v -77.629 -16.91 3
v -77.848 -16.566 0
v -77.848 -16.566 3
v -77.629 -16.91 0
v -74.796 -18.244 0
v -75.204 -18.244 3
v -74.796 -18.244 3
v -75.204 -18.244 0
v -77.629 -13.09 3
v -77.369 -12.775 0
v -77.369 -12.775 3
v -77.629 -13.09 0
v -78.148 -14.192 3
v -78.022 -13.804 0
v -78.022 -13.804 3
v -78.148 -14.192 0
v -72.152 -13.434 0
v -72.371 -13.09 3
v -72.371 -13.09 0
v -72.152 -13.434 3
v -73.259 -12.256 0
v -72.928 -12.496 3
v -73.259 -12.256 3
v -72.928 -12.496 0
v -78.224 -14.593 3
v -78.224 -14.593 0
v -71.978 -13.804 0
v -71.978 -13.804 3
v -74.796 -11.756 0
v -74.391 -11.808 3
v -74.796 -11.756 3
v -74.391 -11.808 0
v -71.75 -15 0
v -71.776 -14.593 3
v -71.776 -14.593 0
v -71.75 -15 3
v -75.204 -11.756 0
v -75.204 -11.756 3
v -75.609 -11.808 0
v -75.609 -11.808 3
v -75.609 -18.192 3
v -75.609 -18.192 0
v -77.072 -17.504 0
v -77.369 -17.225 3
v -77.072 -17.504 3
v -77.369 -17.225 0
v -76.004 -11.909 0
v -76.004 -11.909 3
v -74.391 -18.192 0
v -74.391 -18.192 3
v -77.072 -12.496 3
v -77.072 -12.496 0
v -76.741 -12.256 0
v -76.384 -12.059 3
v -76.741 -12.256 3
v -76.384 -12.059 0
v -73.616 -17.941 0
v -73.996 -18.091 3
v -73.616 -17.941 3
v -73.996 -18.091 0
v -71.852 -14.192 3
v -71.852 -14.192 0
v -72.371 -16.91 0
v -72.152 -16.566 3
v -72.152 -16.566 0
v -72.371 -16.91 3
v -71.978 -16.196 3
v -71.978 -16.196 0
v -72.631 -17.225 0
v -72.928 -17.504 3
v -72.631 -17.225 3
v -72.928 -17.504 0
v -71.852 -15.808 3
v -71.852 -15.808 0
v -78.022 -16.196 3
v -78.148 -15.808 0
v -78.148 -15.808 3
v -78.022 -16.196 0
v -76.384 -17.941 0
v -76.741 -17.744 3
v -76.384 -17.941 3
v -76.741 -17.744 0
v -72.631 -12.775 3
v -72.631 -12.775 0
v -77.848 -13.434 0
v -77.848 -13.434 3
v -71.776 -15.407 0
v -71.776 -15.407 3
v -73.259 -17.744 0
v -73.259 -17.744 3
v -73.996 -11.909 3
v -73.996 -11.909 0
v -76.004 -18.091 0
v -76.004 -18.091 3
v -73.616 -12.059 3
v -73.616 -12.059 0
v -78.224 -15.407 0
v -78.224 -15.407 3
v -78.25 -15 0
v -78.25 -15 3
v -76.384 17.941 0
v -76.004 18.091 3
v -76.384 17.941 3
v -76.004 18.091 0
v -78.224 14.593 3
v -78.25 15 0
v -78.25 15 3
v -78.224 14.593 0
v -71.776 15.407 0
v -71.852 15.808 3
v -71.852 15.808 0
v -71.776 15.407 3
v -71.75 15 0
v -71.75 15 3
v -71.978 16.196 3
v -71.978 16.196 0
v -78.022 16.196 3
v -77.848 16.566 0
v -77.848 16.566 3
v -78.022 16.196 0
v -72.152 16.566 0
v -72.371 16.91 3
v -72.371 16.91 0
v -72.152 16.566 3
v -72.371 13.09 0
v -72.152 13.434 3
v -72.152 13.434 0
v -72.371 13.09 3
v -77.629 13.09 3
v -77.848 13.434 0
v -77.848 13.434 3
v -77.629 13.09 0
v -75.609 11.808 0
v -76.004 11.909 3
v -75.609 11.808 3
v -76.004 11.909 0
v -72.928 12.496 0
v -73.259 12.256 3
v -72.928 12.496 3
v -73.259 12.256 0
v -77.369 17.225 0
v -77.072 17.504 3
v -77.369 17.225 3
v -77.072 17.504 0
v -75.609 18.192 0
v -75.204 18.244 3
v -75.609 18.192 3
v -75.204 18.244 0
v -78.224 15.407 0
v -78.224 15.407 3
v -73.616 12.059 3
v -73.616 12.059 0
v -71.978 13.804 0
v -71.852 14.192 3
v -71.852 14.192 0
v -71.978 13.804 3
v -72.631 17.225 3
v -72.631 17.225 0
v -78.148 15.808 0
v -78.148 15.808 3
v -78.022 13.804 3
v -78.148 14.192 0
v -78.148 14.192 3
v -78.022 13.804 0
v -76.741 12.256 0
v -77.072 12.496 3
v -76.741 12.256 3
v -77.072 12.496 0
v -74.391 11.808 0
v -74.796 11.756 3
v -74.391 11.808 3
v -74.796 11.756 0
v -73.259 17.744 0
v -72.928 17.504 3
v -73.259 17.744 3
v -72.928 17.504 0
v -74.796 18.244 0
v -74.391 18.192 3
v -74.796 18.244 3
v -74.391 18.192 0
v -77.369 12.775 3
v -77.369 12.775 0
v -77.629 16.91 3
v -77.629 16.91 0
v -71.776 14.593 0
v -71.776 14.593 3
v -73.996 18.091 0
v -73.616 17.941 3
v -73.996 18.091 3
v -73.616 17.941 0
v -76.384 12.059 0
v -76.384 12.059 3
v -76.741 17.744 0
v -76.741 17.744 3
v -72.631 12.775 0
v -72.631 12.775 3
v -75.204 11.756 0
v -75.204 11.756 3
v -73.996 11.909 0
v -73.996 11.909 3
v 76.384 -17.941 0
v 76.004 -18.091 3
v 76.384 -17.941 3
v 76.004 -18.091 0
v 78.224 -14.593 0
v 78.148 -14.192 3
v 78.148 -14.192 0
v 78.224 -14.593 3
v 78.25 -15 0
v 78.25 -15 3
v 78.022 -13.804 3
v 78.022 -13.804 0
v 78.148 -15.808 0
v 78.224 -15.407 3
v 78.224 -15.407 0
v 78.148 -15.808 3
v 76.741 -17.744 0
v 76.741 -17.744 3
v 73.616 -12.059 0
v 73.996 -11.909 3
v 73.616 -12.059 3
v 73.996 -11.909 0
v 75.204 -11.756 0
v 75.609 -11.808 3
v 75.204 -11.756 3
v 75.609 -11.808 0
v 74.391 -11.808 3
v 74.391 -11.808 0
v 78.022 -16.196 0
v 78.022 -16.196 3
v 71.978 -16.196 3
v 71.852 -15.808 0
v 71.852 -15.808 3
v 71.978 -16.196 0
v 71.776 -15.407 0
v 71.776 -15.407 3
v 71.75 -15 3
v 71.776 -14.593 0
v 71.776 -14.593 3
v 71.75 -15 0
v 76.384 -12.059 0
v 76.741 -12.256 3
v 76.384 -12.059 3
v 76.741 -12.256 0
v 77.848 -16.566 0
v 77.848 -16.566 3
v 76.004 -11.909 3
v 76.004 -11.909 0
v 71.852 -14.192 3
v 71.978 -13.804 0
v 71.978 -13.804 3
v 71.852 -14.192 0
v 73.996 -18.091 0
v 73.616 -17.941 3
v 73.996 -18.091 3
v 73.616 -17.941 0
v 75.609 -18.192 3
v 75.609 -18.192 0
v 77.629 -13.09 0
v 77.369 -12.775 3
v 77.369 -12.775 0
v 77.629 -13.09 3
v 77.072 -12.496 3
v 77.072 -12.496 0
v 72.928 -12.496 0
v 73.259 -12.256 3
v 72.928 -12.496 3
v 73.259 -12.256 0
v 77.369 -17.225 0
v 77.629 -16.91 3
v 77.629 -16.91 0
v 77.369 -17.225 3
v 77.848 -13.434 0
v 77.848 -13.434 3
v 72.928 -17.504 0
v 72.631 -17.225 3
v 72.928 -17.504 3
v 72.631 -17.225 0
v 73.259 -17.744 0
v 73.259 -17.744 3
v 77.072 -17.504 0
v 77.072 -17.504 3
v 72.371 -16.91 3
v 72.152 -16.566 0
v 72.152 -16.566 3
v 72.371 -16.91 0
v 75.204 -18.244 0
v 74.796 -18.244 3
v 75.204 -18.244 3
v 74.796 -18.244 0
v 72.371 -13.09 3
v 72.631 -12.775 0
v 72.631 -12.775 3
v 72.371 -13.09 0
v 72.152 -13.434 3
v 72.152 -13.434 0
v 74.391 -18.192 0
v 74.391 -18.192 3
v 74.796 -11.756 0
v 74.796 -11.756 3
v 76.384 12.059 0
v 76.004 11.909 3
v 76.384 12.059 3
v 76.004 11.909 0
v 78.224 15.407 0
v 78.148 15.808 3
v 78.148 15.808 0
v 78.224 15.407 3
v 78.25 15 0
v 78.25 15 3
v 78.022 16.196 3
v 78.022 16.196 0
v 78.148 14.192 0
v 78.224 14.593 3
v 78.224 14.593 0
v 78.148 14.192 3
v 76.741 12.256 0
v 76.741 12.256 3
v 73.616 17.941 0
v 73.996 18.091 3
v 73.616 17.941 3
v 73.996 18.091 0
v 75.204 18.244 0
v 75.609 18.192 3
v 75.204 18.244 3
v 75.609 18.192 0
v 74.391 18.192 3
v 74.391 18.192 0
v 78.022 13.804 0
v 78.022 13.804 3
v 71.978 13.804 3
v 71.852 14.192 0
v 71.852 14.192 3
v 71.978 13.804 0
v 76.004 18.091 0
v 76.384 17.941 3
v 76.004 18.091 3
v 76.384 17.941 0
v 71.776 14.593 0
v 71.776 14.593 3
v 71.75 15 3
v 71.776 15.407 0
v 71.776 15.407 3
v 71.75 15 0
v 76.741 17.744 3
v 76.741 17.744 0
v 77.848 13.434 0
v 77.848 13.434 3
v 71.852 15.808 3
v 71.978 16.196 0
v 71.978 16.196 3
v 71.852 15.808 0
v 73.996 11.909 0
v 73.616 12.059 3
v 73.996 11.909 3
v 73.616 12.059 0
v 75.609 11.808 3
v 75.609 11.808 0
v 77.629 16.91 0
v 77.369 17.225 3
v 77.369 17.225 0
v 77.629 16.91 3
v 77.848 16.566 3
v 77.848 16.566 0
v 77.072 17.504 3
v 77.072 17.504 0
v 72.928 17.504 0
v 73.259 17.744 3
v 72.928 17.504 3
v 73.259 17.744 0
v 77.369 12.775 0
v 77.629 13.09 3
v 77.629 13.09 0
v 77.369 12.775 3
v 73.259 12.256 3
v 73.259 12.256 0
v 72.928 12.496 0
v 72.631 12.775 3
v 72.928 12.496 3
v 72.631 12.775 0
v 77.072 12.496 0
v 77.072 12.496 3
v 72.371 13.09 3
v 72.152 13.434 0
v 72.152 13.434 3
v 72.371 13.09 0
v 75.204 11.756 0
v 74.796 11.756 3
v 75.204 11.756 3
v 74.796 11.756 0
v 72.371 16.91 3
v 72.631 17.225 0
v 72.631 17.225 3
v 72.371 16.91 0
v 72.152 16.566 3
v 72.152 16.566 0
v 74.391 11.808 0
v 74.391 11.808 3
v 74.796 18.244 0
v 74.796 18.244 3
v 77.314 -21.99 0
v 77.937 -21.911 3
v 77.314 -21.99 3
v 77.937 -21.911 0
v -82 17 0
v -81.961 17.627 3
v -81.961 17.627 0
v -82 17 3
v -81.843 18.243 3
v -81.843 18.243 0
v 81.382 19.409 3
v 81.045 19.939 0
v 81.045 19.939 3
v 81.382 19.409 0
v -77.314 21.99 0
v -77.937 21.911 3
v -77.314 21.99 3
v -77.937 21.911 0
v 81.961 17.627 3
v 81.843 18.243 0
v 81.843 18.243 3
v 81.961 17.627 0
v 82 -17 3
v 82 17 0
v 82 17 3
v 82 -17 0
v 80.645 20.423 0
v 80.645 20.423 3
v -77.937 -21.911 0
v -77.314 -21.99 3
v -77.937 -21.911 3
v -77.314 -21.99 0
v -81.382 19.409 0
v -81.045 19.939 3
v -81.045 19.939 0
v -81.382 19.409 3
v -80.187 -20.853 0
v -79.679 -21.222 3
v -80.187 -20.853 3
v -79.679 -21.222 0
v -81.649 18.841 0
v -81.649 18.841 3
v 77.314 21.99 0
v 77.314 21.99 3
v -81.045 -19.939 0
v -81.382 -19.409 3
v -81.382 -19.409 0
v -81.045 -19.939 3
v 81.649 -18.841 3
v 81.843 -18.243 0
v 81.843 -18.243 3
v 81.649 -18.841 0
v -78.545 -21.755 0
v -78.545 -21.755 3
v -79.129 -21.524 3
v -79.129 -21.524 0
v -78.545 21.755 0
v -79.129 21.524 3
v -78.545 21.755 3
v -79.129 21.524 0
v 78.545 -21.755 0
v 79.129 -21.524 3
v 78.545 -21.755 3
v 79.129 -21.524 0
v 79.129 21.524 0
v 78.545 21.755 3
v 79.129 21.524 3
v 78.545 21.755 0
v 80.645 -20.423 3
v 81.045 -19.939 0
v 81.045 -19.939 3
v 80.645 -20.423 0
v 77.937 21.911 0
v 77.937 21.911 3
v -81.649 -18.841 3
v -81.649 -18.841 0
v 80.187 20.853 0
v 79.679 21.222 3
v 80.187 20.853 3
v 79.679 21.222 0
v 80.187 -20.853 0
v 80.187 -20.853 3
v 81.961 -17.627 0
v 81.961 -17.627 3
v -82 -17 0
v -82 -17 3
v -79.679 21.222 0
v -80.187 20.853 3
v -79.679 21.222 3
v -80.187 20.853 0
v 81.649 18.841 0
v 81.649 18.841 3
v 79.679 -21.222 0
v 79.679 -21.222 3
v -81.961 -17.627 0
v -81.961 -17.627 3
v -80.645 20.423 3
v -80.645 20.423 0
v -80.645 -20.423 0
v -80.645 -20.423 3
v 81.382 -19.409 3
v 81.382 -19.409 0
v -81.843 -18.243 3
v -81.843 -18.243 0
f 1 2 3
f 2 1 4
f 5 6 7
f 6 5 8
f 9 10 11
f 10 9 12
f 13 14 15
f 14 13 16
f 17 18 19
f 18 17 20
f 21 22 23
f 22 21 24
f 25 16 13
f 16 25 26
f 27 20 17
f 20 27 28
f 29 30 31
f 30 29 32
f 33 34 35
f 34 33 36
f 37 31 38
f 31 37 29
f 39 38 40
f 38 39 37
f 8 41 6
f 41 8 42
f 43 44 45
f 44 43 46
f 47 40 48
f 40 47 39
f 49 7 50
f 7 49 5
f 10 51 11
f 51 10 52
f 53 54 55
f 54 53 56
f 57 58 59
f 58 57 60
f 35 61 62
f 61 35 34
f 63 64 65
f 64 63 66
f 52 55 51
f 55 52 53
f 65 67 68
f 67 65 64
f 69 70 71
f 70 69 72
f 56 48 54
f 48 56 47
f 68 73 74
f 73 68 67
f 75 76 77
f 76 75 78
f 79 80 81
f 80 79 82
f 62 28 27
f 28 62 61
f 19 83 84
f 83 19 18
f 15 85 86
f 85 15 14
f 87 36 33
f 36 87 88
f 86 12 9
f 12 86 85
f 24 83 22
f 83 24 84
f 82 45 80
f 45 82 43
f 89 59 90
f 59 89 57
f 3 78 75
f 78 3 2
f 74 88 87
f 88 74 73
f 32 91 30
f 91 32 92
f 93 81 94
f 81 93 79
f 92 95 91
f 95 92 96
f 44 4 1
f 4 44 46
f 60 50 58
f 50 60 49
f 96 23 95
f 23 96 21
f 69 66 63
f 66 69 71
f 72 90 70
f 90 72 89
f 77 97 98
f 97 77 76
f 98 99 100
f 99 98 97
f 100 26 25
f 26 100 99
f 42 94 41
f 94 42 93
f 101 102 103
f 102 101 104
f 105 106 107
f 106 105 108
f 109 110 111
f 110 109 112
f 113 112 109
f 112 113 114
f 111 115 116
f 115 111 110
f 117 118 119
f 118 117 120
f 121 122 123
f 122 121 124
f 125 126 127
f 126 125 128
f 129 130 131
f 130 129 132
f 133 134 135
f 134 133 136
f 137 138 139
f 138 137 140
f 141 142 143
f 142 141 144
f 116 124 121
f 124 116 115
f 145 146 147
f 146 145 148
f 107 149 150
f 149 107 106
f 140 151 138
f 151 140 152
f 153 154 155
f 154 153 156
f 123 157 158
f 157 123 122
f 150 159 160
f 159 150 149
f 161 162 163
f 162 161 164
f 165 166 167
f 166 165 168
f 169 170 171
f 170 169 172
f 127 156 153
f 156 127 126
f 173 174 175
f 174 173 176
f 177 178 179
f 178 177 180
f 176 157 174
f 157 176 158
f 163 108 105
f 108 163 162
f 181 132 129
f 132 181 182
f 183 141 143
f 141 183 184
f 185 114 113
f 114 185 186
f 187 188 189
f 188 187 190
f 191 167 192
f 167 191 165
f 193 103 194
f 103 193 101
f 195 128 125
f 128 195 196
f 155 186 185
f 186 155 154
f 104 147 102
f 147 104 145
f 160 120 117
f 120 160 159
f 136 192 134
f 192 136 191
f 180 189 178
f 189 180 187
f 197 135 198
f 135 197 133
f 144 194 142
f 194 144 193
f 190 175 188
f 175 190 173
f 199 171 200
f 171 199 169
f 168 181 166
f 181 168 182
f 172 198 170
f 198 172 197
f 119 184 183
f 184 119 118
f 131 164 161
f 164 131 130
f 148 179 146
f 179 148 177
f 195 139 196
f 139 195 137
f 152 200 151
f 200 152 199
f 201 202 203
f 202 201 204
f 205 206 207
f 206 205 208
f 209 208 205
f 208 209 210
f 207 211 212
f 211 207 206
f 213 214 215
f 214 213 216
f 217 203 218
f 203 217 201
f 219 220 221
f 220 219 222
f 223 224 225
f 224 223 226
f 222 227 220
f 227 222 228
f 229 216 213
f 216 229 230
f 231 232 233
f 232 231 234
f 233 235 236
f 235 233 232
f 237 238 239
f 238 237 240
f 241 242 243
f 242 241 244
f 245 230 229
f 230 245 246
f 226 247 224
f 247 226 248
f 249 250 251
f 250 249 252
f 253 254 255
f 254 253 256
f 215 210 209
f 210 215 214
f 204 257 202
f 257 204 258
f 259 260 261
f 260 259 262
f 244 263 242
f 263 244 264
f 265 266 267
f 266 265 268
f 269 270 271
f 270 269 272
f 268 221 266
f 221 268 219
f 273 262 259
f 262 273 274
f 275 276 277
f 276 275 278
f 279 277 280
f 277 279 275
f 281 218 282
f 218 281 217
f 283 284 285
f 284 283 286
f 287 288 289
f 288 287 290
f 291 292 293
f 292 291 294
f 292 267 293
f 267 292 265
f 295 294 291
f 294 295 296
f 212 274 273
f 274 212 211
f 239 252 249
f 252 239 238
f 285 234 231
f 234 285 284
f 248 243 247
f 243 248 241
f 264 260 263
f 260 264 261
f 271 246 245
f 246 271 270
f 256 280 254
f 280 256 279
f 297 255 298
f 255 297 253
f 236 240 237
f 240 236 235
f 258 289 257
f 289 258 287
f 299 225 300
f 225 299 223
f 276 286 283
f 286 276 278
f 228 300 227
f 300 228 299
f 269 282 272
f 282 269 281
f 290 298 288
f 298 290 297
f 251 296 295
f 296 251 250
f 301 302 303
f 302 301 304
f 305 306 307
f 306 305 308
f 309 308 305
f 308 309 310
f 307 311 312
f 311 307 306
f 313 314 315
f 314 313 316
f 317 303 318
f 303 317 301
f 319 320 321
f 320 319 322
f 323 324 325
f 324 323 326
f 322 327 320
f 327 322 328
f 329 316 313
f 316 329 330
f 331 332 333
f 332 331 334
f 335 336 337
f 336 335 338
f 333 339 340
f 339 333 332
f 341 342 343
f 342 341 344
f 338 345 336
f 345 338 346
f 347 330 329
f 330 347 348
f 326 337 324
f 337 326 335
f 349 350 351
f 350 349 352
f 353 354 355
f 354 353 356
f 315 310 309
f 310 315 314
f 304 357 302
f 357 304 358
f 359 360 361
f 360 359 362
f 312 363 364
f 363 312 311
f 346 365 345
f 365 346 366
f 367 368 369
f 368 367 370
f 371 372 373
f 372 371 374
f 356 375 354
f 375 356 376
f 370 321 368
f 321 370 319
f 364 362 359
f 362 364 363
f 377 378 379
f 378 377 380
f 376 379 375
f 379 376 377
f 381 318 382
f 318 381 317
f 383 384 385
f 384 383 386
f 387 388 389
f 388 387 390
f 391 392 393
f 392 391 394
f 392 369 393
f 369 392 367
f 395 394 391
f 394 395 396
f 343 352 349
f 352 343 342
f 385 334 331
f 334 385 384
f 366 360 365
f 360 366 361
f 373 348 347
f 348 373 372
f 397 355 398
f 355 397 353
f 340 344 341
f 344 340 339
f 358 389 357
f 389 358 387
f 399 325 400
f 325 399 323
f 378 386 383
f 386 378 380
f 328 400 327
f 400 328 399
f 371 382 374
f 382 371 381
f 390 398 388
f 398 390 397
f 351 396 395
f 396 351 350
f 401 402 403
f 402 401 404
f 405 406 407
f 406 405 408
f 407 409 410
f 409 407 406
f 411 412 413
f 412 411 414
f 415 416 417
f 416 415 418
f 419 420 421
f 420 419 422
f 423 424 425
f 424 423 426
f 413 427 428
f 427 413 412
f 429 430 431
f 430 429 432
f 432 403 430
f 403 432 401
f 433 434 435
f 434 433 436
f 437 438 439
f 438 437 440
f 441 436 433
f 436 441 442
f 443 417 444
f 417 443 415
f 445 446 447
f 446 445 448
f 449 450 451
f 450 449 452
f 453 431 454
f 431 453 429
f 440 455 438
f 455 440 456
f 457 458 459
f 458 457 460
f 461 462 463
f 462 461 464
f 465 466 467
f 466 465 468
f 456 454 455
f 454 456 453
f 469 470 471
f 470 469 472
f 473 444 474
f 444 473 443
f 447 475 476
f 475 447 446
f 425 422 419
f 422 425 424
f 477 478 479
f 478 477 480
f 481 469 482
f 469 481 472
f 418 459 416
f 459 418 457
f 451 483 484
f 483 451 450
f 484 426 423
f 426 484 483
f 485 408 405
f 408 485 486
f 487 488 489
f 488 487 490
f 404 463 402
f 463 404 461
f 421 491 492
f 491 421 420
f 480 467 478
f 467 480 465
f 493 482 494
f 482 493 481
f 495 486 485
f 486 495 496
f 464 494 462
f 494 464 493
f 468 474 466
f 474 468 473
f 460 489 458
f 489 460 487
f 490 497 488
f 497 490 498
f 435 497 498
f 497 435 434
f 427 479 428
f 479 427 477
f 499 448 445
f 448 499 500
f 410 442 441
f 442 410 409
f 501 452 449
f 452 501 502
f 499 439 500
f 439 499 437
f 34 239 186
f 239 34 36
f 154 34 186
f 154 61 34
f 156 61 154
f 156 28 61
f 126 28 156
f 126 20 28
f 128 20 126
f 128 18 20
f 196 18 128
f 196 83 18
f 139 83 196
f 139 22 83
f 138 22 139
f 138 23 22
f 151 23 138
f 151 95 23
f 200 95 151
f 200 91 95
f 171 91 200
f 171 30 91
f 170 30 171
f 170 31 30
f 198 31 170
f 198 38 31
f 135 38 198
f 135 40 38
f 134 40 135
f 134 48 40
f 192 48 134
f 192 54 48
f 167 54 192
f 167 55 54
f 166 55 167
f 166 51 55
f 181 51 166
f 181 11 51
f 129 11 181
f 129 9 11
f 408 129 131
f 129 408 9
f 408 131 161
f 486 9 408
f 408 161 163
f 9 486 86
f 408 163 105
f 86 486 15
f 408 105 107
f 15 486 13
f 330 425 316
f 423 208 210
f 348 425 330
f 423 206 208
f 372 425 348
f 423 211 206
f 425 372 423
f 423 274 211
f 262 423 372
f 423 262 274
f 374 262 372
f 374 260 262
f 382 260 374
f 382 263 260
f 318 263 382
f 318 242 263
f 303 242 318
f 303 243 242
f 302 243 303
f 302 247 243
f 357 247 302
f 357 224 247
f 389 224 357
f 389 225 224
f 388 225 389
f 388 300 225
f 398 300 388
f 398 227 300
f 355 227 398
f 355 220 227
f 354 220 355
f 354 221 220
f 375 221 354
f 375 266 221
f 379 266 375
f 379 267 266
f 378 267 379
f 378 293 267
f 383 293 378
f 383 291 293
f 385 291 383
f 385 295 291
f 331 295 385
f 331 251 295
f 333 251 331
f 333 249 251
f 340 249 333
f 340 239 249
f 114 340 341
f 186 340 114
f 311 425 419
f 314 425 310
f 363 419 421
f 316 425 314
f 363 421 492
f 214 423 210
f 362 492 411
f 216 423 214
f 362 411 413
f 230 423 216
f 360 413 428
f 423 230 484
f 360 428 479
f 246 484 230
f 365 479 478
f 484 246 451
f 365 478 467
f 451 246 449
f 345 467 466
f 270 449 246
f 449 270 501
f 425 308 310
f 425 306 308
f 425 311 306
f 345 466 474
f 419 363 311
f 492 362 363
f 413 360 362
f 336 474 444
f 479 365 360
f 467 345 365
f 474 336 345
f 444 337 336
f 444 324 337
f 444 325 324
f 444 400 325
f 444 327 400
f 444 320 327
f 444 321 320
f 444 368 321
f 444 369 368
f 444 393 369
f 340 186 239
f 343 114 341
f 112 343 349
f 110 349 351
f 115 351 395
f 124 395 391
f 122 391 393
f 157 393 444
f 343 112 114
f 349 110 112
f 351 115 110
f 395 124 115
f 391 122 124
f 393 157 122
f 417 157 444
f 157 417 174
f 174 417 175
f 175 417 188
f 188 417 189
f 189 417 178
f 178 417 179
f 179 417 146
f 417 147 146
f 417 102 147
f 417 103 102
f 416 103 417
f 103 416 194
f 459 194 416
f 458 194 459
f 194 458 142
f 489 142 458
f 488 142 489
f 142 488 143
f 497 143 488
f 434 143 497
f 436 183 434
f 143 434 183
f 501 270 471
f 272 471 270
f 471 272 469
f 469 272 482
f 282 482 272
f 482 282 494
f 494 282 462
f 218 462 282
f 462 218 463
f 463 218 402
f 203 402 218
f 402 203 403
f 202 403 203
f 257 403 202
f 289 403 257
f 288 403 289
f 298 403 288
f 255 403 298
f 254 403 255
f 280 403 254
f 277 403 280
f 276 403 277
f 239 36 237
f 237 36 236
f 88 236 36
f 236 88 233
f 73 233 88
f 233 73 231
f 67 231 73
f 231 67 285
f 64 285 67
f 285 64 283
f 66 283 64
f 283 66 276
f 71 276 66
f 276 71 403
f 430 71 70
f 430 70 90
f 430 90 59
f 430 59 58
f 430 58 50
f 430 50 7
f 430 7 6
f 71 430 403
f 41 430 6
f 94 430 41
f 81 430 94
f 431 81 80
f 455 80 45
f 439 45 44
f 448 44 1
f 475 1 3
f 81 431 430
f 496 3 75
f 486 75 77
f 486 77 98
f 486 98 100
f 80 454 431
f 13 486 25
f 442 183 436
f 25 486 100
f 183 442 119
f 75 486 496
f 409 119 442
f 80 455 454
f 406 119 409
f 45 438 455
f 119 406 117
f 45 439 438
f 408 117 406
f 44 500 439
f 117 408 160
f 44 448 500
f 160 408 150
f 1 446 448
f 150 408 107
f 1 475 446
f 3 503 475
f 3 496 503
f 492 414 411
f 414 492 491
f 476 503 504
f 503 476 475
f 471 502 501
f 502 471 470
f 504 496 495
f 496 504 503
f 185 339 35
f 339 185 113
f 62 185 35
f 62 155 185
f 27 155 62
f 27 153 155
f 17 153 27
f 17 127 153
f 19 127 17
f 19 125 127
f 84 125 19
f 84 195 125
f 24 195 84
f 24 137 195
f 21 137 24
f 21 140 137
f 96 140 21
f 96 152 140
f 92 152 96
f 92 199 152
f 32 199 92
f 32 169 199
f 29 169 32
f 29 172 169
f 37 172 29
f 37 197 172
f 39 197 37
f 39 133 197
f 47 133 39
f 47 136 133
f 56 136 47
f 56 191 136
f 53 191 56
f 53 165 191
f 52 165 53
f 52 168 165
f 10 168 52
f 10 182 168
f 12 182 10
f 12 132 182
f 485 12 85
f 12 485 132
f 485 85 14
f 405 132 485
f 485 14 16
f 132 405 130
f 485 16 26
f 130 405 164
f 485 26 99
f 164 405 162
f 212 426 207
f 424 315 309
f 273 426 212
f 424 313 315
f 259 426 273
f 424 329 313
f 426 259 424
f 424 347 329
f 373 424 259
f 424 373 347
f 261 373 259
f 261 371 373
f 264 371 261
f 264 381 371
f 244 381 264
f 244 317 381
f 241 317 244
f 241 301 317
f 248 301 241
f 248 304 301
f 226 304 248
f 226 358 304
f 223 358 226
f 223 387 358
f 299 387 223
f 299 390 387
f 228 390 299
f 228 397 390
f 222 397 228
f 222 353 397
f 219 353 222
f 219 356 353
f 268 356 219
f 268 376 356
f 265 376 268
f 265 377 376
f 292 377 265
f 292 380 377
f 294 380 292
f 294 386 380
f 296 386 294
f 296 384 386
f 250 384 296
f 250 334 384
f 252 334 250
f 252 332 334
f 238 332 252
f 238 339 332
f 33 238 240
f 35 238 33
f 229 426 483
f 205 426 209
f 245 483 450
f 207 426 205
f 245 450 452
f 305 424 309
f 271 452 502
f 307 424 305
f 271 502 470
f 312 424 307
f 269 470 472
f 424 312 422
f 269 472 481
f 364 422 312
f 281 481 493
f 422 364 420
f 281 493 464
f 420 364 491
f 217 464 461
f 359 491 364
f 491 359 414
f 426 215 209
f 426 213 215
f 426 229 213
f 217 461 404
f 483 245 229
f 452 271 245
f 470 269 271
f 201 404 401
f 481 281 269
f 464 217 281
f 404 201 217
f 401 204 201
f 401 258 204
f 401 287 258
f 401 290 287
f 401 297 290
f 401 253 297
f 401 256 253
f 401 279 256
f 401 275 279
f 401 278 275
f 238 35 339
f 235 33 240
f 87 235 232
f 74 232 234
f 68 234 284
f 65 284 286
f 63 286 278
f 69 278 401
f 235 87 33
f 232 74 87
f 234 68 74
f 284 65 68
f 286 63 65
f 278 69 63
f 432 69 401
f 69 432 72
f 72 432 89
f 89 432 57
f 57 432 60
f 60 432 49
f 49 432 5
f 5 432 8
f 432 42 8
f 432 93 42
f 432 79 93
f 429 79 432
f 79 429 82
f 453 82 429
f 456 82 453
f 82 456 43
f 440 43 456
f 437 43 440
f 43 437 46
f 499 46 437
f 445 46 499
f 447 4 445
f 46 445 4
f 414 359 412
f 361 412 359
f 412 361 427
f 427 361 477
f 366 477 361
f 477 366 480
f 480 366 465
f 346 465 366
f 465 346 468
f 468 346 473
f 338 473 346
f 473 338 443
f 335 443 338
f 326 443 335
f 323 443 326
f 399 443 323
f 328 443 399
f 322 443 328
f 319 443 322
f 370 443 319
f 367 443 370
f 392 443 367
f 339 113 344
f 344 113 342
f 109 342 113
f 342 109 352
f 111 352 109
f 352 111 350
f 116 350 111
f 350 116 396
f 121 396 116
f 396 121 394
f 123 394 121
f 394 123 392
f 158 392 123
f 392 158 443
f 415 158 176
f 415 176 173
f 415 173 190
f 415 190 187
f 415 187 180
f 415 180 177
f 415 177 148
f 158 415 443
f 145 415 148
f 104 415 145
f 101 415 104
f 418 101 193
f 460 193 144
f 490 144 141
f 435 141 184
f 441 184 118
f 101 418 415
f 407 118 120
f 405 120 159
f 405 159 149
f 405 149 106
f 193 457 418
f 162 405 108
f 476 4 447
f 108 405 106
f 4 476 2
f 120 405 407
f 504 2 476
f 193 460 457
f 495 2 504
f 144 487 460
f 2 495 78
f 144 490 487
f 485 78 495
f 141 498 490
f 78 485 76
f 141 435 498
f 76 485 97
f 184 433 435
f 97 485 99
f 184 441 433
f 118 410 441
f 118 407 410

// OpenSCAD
$fn = 50;


difference() {
	union() {
		hull() {
			translate(v = [-77.0000000000, 17.0000000000, 0]) {
				cylinder(h = 3, r = 5);
			}
			translate(v = [77.0000000000, 17.0000000000, 0]) {
				cylinder(h = 3, r = 5);
			}
			translate(v = [-77.0000000000, -17.0000000000, 0]) {
				cylinder(h = 3, r = 5);
			}
			translate(v = [77.0000000000, -17.0000000000, 0]) {
				cylinder(h = 3, r = 5);
			}
		}
	}
	union() {
		translate(v = [-75.0000000000, -15.0000000000, -100.0000000000]) {
			cylinder(h = 200, r = 3.2500000000);
		}
		translate(v = [-75.0000000000, 15.0000000000, -100.0000000000]) {
			cylinder(h = 200, r = 3.2500000000);
		}
		translate(v = [75.0000000000, -15.0000000000, -100.0000000000]) {
			cylinder(h = 200, r = 3.2500000000);
		}
		translate(v = [75.0000000000, 15.0000000000, -100.0000000000]) {
			cylinder(h = 200, r = 3.2500000000);
		}
	}
}
